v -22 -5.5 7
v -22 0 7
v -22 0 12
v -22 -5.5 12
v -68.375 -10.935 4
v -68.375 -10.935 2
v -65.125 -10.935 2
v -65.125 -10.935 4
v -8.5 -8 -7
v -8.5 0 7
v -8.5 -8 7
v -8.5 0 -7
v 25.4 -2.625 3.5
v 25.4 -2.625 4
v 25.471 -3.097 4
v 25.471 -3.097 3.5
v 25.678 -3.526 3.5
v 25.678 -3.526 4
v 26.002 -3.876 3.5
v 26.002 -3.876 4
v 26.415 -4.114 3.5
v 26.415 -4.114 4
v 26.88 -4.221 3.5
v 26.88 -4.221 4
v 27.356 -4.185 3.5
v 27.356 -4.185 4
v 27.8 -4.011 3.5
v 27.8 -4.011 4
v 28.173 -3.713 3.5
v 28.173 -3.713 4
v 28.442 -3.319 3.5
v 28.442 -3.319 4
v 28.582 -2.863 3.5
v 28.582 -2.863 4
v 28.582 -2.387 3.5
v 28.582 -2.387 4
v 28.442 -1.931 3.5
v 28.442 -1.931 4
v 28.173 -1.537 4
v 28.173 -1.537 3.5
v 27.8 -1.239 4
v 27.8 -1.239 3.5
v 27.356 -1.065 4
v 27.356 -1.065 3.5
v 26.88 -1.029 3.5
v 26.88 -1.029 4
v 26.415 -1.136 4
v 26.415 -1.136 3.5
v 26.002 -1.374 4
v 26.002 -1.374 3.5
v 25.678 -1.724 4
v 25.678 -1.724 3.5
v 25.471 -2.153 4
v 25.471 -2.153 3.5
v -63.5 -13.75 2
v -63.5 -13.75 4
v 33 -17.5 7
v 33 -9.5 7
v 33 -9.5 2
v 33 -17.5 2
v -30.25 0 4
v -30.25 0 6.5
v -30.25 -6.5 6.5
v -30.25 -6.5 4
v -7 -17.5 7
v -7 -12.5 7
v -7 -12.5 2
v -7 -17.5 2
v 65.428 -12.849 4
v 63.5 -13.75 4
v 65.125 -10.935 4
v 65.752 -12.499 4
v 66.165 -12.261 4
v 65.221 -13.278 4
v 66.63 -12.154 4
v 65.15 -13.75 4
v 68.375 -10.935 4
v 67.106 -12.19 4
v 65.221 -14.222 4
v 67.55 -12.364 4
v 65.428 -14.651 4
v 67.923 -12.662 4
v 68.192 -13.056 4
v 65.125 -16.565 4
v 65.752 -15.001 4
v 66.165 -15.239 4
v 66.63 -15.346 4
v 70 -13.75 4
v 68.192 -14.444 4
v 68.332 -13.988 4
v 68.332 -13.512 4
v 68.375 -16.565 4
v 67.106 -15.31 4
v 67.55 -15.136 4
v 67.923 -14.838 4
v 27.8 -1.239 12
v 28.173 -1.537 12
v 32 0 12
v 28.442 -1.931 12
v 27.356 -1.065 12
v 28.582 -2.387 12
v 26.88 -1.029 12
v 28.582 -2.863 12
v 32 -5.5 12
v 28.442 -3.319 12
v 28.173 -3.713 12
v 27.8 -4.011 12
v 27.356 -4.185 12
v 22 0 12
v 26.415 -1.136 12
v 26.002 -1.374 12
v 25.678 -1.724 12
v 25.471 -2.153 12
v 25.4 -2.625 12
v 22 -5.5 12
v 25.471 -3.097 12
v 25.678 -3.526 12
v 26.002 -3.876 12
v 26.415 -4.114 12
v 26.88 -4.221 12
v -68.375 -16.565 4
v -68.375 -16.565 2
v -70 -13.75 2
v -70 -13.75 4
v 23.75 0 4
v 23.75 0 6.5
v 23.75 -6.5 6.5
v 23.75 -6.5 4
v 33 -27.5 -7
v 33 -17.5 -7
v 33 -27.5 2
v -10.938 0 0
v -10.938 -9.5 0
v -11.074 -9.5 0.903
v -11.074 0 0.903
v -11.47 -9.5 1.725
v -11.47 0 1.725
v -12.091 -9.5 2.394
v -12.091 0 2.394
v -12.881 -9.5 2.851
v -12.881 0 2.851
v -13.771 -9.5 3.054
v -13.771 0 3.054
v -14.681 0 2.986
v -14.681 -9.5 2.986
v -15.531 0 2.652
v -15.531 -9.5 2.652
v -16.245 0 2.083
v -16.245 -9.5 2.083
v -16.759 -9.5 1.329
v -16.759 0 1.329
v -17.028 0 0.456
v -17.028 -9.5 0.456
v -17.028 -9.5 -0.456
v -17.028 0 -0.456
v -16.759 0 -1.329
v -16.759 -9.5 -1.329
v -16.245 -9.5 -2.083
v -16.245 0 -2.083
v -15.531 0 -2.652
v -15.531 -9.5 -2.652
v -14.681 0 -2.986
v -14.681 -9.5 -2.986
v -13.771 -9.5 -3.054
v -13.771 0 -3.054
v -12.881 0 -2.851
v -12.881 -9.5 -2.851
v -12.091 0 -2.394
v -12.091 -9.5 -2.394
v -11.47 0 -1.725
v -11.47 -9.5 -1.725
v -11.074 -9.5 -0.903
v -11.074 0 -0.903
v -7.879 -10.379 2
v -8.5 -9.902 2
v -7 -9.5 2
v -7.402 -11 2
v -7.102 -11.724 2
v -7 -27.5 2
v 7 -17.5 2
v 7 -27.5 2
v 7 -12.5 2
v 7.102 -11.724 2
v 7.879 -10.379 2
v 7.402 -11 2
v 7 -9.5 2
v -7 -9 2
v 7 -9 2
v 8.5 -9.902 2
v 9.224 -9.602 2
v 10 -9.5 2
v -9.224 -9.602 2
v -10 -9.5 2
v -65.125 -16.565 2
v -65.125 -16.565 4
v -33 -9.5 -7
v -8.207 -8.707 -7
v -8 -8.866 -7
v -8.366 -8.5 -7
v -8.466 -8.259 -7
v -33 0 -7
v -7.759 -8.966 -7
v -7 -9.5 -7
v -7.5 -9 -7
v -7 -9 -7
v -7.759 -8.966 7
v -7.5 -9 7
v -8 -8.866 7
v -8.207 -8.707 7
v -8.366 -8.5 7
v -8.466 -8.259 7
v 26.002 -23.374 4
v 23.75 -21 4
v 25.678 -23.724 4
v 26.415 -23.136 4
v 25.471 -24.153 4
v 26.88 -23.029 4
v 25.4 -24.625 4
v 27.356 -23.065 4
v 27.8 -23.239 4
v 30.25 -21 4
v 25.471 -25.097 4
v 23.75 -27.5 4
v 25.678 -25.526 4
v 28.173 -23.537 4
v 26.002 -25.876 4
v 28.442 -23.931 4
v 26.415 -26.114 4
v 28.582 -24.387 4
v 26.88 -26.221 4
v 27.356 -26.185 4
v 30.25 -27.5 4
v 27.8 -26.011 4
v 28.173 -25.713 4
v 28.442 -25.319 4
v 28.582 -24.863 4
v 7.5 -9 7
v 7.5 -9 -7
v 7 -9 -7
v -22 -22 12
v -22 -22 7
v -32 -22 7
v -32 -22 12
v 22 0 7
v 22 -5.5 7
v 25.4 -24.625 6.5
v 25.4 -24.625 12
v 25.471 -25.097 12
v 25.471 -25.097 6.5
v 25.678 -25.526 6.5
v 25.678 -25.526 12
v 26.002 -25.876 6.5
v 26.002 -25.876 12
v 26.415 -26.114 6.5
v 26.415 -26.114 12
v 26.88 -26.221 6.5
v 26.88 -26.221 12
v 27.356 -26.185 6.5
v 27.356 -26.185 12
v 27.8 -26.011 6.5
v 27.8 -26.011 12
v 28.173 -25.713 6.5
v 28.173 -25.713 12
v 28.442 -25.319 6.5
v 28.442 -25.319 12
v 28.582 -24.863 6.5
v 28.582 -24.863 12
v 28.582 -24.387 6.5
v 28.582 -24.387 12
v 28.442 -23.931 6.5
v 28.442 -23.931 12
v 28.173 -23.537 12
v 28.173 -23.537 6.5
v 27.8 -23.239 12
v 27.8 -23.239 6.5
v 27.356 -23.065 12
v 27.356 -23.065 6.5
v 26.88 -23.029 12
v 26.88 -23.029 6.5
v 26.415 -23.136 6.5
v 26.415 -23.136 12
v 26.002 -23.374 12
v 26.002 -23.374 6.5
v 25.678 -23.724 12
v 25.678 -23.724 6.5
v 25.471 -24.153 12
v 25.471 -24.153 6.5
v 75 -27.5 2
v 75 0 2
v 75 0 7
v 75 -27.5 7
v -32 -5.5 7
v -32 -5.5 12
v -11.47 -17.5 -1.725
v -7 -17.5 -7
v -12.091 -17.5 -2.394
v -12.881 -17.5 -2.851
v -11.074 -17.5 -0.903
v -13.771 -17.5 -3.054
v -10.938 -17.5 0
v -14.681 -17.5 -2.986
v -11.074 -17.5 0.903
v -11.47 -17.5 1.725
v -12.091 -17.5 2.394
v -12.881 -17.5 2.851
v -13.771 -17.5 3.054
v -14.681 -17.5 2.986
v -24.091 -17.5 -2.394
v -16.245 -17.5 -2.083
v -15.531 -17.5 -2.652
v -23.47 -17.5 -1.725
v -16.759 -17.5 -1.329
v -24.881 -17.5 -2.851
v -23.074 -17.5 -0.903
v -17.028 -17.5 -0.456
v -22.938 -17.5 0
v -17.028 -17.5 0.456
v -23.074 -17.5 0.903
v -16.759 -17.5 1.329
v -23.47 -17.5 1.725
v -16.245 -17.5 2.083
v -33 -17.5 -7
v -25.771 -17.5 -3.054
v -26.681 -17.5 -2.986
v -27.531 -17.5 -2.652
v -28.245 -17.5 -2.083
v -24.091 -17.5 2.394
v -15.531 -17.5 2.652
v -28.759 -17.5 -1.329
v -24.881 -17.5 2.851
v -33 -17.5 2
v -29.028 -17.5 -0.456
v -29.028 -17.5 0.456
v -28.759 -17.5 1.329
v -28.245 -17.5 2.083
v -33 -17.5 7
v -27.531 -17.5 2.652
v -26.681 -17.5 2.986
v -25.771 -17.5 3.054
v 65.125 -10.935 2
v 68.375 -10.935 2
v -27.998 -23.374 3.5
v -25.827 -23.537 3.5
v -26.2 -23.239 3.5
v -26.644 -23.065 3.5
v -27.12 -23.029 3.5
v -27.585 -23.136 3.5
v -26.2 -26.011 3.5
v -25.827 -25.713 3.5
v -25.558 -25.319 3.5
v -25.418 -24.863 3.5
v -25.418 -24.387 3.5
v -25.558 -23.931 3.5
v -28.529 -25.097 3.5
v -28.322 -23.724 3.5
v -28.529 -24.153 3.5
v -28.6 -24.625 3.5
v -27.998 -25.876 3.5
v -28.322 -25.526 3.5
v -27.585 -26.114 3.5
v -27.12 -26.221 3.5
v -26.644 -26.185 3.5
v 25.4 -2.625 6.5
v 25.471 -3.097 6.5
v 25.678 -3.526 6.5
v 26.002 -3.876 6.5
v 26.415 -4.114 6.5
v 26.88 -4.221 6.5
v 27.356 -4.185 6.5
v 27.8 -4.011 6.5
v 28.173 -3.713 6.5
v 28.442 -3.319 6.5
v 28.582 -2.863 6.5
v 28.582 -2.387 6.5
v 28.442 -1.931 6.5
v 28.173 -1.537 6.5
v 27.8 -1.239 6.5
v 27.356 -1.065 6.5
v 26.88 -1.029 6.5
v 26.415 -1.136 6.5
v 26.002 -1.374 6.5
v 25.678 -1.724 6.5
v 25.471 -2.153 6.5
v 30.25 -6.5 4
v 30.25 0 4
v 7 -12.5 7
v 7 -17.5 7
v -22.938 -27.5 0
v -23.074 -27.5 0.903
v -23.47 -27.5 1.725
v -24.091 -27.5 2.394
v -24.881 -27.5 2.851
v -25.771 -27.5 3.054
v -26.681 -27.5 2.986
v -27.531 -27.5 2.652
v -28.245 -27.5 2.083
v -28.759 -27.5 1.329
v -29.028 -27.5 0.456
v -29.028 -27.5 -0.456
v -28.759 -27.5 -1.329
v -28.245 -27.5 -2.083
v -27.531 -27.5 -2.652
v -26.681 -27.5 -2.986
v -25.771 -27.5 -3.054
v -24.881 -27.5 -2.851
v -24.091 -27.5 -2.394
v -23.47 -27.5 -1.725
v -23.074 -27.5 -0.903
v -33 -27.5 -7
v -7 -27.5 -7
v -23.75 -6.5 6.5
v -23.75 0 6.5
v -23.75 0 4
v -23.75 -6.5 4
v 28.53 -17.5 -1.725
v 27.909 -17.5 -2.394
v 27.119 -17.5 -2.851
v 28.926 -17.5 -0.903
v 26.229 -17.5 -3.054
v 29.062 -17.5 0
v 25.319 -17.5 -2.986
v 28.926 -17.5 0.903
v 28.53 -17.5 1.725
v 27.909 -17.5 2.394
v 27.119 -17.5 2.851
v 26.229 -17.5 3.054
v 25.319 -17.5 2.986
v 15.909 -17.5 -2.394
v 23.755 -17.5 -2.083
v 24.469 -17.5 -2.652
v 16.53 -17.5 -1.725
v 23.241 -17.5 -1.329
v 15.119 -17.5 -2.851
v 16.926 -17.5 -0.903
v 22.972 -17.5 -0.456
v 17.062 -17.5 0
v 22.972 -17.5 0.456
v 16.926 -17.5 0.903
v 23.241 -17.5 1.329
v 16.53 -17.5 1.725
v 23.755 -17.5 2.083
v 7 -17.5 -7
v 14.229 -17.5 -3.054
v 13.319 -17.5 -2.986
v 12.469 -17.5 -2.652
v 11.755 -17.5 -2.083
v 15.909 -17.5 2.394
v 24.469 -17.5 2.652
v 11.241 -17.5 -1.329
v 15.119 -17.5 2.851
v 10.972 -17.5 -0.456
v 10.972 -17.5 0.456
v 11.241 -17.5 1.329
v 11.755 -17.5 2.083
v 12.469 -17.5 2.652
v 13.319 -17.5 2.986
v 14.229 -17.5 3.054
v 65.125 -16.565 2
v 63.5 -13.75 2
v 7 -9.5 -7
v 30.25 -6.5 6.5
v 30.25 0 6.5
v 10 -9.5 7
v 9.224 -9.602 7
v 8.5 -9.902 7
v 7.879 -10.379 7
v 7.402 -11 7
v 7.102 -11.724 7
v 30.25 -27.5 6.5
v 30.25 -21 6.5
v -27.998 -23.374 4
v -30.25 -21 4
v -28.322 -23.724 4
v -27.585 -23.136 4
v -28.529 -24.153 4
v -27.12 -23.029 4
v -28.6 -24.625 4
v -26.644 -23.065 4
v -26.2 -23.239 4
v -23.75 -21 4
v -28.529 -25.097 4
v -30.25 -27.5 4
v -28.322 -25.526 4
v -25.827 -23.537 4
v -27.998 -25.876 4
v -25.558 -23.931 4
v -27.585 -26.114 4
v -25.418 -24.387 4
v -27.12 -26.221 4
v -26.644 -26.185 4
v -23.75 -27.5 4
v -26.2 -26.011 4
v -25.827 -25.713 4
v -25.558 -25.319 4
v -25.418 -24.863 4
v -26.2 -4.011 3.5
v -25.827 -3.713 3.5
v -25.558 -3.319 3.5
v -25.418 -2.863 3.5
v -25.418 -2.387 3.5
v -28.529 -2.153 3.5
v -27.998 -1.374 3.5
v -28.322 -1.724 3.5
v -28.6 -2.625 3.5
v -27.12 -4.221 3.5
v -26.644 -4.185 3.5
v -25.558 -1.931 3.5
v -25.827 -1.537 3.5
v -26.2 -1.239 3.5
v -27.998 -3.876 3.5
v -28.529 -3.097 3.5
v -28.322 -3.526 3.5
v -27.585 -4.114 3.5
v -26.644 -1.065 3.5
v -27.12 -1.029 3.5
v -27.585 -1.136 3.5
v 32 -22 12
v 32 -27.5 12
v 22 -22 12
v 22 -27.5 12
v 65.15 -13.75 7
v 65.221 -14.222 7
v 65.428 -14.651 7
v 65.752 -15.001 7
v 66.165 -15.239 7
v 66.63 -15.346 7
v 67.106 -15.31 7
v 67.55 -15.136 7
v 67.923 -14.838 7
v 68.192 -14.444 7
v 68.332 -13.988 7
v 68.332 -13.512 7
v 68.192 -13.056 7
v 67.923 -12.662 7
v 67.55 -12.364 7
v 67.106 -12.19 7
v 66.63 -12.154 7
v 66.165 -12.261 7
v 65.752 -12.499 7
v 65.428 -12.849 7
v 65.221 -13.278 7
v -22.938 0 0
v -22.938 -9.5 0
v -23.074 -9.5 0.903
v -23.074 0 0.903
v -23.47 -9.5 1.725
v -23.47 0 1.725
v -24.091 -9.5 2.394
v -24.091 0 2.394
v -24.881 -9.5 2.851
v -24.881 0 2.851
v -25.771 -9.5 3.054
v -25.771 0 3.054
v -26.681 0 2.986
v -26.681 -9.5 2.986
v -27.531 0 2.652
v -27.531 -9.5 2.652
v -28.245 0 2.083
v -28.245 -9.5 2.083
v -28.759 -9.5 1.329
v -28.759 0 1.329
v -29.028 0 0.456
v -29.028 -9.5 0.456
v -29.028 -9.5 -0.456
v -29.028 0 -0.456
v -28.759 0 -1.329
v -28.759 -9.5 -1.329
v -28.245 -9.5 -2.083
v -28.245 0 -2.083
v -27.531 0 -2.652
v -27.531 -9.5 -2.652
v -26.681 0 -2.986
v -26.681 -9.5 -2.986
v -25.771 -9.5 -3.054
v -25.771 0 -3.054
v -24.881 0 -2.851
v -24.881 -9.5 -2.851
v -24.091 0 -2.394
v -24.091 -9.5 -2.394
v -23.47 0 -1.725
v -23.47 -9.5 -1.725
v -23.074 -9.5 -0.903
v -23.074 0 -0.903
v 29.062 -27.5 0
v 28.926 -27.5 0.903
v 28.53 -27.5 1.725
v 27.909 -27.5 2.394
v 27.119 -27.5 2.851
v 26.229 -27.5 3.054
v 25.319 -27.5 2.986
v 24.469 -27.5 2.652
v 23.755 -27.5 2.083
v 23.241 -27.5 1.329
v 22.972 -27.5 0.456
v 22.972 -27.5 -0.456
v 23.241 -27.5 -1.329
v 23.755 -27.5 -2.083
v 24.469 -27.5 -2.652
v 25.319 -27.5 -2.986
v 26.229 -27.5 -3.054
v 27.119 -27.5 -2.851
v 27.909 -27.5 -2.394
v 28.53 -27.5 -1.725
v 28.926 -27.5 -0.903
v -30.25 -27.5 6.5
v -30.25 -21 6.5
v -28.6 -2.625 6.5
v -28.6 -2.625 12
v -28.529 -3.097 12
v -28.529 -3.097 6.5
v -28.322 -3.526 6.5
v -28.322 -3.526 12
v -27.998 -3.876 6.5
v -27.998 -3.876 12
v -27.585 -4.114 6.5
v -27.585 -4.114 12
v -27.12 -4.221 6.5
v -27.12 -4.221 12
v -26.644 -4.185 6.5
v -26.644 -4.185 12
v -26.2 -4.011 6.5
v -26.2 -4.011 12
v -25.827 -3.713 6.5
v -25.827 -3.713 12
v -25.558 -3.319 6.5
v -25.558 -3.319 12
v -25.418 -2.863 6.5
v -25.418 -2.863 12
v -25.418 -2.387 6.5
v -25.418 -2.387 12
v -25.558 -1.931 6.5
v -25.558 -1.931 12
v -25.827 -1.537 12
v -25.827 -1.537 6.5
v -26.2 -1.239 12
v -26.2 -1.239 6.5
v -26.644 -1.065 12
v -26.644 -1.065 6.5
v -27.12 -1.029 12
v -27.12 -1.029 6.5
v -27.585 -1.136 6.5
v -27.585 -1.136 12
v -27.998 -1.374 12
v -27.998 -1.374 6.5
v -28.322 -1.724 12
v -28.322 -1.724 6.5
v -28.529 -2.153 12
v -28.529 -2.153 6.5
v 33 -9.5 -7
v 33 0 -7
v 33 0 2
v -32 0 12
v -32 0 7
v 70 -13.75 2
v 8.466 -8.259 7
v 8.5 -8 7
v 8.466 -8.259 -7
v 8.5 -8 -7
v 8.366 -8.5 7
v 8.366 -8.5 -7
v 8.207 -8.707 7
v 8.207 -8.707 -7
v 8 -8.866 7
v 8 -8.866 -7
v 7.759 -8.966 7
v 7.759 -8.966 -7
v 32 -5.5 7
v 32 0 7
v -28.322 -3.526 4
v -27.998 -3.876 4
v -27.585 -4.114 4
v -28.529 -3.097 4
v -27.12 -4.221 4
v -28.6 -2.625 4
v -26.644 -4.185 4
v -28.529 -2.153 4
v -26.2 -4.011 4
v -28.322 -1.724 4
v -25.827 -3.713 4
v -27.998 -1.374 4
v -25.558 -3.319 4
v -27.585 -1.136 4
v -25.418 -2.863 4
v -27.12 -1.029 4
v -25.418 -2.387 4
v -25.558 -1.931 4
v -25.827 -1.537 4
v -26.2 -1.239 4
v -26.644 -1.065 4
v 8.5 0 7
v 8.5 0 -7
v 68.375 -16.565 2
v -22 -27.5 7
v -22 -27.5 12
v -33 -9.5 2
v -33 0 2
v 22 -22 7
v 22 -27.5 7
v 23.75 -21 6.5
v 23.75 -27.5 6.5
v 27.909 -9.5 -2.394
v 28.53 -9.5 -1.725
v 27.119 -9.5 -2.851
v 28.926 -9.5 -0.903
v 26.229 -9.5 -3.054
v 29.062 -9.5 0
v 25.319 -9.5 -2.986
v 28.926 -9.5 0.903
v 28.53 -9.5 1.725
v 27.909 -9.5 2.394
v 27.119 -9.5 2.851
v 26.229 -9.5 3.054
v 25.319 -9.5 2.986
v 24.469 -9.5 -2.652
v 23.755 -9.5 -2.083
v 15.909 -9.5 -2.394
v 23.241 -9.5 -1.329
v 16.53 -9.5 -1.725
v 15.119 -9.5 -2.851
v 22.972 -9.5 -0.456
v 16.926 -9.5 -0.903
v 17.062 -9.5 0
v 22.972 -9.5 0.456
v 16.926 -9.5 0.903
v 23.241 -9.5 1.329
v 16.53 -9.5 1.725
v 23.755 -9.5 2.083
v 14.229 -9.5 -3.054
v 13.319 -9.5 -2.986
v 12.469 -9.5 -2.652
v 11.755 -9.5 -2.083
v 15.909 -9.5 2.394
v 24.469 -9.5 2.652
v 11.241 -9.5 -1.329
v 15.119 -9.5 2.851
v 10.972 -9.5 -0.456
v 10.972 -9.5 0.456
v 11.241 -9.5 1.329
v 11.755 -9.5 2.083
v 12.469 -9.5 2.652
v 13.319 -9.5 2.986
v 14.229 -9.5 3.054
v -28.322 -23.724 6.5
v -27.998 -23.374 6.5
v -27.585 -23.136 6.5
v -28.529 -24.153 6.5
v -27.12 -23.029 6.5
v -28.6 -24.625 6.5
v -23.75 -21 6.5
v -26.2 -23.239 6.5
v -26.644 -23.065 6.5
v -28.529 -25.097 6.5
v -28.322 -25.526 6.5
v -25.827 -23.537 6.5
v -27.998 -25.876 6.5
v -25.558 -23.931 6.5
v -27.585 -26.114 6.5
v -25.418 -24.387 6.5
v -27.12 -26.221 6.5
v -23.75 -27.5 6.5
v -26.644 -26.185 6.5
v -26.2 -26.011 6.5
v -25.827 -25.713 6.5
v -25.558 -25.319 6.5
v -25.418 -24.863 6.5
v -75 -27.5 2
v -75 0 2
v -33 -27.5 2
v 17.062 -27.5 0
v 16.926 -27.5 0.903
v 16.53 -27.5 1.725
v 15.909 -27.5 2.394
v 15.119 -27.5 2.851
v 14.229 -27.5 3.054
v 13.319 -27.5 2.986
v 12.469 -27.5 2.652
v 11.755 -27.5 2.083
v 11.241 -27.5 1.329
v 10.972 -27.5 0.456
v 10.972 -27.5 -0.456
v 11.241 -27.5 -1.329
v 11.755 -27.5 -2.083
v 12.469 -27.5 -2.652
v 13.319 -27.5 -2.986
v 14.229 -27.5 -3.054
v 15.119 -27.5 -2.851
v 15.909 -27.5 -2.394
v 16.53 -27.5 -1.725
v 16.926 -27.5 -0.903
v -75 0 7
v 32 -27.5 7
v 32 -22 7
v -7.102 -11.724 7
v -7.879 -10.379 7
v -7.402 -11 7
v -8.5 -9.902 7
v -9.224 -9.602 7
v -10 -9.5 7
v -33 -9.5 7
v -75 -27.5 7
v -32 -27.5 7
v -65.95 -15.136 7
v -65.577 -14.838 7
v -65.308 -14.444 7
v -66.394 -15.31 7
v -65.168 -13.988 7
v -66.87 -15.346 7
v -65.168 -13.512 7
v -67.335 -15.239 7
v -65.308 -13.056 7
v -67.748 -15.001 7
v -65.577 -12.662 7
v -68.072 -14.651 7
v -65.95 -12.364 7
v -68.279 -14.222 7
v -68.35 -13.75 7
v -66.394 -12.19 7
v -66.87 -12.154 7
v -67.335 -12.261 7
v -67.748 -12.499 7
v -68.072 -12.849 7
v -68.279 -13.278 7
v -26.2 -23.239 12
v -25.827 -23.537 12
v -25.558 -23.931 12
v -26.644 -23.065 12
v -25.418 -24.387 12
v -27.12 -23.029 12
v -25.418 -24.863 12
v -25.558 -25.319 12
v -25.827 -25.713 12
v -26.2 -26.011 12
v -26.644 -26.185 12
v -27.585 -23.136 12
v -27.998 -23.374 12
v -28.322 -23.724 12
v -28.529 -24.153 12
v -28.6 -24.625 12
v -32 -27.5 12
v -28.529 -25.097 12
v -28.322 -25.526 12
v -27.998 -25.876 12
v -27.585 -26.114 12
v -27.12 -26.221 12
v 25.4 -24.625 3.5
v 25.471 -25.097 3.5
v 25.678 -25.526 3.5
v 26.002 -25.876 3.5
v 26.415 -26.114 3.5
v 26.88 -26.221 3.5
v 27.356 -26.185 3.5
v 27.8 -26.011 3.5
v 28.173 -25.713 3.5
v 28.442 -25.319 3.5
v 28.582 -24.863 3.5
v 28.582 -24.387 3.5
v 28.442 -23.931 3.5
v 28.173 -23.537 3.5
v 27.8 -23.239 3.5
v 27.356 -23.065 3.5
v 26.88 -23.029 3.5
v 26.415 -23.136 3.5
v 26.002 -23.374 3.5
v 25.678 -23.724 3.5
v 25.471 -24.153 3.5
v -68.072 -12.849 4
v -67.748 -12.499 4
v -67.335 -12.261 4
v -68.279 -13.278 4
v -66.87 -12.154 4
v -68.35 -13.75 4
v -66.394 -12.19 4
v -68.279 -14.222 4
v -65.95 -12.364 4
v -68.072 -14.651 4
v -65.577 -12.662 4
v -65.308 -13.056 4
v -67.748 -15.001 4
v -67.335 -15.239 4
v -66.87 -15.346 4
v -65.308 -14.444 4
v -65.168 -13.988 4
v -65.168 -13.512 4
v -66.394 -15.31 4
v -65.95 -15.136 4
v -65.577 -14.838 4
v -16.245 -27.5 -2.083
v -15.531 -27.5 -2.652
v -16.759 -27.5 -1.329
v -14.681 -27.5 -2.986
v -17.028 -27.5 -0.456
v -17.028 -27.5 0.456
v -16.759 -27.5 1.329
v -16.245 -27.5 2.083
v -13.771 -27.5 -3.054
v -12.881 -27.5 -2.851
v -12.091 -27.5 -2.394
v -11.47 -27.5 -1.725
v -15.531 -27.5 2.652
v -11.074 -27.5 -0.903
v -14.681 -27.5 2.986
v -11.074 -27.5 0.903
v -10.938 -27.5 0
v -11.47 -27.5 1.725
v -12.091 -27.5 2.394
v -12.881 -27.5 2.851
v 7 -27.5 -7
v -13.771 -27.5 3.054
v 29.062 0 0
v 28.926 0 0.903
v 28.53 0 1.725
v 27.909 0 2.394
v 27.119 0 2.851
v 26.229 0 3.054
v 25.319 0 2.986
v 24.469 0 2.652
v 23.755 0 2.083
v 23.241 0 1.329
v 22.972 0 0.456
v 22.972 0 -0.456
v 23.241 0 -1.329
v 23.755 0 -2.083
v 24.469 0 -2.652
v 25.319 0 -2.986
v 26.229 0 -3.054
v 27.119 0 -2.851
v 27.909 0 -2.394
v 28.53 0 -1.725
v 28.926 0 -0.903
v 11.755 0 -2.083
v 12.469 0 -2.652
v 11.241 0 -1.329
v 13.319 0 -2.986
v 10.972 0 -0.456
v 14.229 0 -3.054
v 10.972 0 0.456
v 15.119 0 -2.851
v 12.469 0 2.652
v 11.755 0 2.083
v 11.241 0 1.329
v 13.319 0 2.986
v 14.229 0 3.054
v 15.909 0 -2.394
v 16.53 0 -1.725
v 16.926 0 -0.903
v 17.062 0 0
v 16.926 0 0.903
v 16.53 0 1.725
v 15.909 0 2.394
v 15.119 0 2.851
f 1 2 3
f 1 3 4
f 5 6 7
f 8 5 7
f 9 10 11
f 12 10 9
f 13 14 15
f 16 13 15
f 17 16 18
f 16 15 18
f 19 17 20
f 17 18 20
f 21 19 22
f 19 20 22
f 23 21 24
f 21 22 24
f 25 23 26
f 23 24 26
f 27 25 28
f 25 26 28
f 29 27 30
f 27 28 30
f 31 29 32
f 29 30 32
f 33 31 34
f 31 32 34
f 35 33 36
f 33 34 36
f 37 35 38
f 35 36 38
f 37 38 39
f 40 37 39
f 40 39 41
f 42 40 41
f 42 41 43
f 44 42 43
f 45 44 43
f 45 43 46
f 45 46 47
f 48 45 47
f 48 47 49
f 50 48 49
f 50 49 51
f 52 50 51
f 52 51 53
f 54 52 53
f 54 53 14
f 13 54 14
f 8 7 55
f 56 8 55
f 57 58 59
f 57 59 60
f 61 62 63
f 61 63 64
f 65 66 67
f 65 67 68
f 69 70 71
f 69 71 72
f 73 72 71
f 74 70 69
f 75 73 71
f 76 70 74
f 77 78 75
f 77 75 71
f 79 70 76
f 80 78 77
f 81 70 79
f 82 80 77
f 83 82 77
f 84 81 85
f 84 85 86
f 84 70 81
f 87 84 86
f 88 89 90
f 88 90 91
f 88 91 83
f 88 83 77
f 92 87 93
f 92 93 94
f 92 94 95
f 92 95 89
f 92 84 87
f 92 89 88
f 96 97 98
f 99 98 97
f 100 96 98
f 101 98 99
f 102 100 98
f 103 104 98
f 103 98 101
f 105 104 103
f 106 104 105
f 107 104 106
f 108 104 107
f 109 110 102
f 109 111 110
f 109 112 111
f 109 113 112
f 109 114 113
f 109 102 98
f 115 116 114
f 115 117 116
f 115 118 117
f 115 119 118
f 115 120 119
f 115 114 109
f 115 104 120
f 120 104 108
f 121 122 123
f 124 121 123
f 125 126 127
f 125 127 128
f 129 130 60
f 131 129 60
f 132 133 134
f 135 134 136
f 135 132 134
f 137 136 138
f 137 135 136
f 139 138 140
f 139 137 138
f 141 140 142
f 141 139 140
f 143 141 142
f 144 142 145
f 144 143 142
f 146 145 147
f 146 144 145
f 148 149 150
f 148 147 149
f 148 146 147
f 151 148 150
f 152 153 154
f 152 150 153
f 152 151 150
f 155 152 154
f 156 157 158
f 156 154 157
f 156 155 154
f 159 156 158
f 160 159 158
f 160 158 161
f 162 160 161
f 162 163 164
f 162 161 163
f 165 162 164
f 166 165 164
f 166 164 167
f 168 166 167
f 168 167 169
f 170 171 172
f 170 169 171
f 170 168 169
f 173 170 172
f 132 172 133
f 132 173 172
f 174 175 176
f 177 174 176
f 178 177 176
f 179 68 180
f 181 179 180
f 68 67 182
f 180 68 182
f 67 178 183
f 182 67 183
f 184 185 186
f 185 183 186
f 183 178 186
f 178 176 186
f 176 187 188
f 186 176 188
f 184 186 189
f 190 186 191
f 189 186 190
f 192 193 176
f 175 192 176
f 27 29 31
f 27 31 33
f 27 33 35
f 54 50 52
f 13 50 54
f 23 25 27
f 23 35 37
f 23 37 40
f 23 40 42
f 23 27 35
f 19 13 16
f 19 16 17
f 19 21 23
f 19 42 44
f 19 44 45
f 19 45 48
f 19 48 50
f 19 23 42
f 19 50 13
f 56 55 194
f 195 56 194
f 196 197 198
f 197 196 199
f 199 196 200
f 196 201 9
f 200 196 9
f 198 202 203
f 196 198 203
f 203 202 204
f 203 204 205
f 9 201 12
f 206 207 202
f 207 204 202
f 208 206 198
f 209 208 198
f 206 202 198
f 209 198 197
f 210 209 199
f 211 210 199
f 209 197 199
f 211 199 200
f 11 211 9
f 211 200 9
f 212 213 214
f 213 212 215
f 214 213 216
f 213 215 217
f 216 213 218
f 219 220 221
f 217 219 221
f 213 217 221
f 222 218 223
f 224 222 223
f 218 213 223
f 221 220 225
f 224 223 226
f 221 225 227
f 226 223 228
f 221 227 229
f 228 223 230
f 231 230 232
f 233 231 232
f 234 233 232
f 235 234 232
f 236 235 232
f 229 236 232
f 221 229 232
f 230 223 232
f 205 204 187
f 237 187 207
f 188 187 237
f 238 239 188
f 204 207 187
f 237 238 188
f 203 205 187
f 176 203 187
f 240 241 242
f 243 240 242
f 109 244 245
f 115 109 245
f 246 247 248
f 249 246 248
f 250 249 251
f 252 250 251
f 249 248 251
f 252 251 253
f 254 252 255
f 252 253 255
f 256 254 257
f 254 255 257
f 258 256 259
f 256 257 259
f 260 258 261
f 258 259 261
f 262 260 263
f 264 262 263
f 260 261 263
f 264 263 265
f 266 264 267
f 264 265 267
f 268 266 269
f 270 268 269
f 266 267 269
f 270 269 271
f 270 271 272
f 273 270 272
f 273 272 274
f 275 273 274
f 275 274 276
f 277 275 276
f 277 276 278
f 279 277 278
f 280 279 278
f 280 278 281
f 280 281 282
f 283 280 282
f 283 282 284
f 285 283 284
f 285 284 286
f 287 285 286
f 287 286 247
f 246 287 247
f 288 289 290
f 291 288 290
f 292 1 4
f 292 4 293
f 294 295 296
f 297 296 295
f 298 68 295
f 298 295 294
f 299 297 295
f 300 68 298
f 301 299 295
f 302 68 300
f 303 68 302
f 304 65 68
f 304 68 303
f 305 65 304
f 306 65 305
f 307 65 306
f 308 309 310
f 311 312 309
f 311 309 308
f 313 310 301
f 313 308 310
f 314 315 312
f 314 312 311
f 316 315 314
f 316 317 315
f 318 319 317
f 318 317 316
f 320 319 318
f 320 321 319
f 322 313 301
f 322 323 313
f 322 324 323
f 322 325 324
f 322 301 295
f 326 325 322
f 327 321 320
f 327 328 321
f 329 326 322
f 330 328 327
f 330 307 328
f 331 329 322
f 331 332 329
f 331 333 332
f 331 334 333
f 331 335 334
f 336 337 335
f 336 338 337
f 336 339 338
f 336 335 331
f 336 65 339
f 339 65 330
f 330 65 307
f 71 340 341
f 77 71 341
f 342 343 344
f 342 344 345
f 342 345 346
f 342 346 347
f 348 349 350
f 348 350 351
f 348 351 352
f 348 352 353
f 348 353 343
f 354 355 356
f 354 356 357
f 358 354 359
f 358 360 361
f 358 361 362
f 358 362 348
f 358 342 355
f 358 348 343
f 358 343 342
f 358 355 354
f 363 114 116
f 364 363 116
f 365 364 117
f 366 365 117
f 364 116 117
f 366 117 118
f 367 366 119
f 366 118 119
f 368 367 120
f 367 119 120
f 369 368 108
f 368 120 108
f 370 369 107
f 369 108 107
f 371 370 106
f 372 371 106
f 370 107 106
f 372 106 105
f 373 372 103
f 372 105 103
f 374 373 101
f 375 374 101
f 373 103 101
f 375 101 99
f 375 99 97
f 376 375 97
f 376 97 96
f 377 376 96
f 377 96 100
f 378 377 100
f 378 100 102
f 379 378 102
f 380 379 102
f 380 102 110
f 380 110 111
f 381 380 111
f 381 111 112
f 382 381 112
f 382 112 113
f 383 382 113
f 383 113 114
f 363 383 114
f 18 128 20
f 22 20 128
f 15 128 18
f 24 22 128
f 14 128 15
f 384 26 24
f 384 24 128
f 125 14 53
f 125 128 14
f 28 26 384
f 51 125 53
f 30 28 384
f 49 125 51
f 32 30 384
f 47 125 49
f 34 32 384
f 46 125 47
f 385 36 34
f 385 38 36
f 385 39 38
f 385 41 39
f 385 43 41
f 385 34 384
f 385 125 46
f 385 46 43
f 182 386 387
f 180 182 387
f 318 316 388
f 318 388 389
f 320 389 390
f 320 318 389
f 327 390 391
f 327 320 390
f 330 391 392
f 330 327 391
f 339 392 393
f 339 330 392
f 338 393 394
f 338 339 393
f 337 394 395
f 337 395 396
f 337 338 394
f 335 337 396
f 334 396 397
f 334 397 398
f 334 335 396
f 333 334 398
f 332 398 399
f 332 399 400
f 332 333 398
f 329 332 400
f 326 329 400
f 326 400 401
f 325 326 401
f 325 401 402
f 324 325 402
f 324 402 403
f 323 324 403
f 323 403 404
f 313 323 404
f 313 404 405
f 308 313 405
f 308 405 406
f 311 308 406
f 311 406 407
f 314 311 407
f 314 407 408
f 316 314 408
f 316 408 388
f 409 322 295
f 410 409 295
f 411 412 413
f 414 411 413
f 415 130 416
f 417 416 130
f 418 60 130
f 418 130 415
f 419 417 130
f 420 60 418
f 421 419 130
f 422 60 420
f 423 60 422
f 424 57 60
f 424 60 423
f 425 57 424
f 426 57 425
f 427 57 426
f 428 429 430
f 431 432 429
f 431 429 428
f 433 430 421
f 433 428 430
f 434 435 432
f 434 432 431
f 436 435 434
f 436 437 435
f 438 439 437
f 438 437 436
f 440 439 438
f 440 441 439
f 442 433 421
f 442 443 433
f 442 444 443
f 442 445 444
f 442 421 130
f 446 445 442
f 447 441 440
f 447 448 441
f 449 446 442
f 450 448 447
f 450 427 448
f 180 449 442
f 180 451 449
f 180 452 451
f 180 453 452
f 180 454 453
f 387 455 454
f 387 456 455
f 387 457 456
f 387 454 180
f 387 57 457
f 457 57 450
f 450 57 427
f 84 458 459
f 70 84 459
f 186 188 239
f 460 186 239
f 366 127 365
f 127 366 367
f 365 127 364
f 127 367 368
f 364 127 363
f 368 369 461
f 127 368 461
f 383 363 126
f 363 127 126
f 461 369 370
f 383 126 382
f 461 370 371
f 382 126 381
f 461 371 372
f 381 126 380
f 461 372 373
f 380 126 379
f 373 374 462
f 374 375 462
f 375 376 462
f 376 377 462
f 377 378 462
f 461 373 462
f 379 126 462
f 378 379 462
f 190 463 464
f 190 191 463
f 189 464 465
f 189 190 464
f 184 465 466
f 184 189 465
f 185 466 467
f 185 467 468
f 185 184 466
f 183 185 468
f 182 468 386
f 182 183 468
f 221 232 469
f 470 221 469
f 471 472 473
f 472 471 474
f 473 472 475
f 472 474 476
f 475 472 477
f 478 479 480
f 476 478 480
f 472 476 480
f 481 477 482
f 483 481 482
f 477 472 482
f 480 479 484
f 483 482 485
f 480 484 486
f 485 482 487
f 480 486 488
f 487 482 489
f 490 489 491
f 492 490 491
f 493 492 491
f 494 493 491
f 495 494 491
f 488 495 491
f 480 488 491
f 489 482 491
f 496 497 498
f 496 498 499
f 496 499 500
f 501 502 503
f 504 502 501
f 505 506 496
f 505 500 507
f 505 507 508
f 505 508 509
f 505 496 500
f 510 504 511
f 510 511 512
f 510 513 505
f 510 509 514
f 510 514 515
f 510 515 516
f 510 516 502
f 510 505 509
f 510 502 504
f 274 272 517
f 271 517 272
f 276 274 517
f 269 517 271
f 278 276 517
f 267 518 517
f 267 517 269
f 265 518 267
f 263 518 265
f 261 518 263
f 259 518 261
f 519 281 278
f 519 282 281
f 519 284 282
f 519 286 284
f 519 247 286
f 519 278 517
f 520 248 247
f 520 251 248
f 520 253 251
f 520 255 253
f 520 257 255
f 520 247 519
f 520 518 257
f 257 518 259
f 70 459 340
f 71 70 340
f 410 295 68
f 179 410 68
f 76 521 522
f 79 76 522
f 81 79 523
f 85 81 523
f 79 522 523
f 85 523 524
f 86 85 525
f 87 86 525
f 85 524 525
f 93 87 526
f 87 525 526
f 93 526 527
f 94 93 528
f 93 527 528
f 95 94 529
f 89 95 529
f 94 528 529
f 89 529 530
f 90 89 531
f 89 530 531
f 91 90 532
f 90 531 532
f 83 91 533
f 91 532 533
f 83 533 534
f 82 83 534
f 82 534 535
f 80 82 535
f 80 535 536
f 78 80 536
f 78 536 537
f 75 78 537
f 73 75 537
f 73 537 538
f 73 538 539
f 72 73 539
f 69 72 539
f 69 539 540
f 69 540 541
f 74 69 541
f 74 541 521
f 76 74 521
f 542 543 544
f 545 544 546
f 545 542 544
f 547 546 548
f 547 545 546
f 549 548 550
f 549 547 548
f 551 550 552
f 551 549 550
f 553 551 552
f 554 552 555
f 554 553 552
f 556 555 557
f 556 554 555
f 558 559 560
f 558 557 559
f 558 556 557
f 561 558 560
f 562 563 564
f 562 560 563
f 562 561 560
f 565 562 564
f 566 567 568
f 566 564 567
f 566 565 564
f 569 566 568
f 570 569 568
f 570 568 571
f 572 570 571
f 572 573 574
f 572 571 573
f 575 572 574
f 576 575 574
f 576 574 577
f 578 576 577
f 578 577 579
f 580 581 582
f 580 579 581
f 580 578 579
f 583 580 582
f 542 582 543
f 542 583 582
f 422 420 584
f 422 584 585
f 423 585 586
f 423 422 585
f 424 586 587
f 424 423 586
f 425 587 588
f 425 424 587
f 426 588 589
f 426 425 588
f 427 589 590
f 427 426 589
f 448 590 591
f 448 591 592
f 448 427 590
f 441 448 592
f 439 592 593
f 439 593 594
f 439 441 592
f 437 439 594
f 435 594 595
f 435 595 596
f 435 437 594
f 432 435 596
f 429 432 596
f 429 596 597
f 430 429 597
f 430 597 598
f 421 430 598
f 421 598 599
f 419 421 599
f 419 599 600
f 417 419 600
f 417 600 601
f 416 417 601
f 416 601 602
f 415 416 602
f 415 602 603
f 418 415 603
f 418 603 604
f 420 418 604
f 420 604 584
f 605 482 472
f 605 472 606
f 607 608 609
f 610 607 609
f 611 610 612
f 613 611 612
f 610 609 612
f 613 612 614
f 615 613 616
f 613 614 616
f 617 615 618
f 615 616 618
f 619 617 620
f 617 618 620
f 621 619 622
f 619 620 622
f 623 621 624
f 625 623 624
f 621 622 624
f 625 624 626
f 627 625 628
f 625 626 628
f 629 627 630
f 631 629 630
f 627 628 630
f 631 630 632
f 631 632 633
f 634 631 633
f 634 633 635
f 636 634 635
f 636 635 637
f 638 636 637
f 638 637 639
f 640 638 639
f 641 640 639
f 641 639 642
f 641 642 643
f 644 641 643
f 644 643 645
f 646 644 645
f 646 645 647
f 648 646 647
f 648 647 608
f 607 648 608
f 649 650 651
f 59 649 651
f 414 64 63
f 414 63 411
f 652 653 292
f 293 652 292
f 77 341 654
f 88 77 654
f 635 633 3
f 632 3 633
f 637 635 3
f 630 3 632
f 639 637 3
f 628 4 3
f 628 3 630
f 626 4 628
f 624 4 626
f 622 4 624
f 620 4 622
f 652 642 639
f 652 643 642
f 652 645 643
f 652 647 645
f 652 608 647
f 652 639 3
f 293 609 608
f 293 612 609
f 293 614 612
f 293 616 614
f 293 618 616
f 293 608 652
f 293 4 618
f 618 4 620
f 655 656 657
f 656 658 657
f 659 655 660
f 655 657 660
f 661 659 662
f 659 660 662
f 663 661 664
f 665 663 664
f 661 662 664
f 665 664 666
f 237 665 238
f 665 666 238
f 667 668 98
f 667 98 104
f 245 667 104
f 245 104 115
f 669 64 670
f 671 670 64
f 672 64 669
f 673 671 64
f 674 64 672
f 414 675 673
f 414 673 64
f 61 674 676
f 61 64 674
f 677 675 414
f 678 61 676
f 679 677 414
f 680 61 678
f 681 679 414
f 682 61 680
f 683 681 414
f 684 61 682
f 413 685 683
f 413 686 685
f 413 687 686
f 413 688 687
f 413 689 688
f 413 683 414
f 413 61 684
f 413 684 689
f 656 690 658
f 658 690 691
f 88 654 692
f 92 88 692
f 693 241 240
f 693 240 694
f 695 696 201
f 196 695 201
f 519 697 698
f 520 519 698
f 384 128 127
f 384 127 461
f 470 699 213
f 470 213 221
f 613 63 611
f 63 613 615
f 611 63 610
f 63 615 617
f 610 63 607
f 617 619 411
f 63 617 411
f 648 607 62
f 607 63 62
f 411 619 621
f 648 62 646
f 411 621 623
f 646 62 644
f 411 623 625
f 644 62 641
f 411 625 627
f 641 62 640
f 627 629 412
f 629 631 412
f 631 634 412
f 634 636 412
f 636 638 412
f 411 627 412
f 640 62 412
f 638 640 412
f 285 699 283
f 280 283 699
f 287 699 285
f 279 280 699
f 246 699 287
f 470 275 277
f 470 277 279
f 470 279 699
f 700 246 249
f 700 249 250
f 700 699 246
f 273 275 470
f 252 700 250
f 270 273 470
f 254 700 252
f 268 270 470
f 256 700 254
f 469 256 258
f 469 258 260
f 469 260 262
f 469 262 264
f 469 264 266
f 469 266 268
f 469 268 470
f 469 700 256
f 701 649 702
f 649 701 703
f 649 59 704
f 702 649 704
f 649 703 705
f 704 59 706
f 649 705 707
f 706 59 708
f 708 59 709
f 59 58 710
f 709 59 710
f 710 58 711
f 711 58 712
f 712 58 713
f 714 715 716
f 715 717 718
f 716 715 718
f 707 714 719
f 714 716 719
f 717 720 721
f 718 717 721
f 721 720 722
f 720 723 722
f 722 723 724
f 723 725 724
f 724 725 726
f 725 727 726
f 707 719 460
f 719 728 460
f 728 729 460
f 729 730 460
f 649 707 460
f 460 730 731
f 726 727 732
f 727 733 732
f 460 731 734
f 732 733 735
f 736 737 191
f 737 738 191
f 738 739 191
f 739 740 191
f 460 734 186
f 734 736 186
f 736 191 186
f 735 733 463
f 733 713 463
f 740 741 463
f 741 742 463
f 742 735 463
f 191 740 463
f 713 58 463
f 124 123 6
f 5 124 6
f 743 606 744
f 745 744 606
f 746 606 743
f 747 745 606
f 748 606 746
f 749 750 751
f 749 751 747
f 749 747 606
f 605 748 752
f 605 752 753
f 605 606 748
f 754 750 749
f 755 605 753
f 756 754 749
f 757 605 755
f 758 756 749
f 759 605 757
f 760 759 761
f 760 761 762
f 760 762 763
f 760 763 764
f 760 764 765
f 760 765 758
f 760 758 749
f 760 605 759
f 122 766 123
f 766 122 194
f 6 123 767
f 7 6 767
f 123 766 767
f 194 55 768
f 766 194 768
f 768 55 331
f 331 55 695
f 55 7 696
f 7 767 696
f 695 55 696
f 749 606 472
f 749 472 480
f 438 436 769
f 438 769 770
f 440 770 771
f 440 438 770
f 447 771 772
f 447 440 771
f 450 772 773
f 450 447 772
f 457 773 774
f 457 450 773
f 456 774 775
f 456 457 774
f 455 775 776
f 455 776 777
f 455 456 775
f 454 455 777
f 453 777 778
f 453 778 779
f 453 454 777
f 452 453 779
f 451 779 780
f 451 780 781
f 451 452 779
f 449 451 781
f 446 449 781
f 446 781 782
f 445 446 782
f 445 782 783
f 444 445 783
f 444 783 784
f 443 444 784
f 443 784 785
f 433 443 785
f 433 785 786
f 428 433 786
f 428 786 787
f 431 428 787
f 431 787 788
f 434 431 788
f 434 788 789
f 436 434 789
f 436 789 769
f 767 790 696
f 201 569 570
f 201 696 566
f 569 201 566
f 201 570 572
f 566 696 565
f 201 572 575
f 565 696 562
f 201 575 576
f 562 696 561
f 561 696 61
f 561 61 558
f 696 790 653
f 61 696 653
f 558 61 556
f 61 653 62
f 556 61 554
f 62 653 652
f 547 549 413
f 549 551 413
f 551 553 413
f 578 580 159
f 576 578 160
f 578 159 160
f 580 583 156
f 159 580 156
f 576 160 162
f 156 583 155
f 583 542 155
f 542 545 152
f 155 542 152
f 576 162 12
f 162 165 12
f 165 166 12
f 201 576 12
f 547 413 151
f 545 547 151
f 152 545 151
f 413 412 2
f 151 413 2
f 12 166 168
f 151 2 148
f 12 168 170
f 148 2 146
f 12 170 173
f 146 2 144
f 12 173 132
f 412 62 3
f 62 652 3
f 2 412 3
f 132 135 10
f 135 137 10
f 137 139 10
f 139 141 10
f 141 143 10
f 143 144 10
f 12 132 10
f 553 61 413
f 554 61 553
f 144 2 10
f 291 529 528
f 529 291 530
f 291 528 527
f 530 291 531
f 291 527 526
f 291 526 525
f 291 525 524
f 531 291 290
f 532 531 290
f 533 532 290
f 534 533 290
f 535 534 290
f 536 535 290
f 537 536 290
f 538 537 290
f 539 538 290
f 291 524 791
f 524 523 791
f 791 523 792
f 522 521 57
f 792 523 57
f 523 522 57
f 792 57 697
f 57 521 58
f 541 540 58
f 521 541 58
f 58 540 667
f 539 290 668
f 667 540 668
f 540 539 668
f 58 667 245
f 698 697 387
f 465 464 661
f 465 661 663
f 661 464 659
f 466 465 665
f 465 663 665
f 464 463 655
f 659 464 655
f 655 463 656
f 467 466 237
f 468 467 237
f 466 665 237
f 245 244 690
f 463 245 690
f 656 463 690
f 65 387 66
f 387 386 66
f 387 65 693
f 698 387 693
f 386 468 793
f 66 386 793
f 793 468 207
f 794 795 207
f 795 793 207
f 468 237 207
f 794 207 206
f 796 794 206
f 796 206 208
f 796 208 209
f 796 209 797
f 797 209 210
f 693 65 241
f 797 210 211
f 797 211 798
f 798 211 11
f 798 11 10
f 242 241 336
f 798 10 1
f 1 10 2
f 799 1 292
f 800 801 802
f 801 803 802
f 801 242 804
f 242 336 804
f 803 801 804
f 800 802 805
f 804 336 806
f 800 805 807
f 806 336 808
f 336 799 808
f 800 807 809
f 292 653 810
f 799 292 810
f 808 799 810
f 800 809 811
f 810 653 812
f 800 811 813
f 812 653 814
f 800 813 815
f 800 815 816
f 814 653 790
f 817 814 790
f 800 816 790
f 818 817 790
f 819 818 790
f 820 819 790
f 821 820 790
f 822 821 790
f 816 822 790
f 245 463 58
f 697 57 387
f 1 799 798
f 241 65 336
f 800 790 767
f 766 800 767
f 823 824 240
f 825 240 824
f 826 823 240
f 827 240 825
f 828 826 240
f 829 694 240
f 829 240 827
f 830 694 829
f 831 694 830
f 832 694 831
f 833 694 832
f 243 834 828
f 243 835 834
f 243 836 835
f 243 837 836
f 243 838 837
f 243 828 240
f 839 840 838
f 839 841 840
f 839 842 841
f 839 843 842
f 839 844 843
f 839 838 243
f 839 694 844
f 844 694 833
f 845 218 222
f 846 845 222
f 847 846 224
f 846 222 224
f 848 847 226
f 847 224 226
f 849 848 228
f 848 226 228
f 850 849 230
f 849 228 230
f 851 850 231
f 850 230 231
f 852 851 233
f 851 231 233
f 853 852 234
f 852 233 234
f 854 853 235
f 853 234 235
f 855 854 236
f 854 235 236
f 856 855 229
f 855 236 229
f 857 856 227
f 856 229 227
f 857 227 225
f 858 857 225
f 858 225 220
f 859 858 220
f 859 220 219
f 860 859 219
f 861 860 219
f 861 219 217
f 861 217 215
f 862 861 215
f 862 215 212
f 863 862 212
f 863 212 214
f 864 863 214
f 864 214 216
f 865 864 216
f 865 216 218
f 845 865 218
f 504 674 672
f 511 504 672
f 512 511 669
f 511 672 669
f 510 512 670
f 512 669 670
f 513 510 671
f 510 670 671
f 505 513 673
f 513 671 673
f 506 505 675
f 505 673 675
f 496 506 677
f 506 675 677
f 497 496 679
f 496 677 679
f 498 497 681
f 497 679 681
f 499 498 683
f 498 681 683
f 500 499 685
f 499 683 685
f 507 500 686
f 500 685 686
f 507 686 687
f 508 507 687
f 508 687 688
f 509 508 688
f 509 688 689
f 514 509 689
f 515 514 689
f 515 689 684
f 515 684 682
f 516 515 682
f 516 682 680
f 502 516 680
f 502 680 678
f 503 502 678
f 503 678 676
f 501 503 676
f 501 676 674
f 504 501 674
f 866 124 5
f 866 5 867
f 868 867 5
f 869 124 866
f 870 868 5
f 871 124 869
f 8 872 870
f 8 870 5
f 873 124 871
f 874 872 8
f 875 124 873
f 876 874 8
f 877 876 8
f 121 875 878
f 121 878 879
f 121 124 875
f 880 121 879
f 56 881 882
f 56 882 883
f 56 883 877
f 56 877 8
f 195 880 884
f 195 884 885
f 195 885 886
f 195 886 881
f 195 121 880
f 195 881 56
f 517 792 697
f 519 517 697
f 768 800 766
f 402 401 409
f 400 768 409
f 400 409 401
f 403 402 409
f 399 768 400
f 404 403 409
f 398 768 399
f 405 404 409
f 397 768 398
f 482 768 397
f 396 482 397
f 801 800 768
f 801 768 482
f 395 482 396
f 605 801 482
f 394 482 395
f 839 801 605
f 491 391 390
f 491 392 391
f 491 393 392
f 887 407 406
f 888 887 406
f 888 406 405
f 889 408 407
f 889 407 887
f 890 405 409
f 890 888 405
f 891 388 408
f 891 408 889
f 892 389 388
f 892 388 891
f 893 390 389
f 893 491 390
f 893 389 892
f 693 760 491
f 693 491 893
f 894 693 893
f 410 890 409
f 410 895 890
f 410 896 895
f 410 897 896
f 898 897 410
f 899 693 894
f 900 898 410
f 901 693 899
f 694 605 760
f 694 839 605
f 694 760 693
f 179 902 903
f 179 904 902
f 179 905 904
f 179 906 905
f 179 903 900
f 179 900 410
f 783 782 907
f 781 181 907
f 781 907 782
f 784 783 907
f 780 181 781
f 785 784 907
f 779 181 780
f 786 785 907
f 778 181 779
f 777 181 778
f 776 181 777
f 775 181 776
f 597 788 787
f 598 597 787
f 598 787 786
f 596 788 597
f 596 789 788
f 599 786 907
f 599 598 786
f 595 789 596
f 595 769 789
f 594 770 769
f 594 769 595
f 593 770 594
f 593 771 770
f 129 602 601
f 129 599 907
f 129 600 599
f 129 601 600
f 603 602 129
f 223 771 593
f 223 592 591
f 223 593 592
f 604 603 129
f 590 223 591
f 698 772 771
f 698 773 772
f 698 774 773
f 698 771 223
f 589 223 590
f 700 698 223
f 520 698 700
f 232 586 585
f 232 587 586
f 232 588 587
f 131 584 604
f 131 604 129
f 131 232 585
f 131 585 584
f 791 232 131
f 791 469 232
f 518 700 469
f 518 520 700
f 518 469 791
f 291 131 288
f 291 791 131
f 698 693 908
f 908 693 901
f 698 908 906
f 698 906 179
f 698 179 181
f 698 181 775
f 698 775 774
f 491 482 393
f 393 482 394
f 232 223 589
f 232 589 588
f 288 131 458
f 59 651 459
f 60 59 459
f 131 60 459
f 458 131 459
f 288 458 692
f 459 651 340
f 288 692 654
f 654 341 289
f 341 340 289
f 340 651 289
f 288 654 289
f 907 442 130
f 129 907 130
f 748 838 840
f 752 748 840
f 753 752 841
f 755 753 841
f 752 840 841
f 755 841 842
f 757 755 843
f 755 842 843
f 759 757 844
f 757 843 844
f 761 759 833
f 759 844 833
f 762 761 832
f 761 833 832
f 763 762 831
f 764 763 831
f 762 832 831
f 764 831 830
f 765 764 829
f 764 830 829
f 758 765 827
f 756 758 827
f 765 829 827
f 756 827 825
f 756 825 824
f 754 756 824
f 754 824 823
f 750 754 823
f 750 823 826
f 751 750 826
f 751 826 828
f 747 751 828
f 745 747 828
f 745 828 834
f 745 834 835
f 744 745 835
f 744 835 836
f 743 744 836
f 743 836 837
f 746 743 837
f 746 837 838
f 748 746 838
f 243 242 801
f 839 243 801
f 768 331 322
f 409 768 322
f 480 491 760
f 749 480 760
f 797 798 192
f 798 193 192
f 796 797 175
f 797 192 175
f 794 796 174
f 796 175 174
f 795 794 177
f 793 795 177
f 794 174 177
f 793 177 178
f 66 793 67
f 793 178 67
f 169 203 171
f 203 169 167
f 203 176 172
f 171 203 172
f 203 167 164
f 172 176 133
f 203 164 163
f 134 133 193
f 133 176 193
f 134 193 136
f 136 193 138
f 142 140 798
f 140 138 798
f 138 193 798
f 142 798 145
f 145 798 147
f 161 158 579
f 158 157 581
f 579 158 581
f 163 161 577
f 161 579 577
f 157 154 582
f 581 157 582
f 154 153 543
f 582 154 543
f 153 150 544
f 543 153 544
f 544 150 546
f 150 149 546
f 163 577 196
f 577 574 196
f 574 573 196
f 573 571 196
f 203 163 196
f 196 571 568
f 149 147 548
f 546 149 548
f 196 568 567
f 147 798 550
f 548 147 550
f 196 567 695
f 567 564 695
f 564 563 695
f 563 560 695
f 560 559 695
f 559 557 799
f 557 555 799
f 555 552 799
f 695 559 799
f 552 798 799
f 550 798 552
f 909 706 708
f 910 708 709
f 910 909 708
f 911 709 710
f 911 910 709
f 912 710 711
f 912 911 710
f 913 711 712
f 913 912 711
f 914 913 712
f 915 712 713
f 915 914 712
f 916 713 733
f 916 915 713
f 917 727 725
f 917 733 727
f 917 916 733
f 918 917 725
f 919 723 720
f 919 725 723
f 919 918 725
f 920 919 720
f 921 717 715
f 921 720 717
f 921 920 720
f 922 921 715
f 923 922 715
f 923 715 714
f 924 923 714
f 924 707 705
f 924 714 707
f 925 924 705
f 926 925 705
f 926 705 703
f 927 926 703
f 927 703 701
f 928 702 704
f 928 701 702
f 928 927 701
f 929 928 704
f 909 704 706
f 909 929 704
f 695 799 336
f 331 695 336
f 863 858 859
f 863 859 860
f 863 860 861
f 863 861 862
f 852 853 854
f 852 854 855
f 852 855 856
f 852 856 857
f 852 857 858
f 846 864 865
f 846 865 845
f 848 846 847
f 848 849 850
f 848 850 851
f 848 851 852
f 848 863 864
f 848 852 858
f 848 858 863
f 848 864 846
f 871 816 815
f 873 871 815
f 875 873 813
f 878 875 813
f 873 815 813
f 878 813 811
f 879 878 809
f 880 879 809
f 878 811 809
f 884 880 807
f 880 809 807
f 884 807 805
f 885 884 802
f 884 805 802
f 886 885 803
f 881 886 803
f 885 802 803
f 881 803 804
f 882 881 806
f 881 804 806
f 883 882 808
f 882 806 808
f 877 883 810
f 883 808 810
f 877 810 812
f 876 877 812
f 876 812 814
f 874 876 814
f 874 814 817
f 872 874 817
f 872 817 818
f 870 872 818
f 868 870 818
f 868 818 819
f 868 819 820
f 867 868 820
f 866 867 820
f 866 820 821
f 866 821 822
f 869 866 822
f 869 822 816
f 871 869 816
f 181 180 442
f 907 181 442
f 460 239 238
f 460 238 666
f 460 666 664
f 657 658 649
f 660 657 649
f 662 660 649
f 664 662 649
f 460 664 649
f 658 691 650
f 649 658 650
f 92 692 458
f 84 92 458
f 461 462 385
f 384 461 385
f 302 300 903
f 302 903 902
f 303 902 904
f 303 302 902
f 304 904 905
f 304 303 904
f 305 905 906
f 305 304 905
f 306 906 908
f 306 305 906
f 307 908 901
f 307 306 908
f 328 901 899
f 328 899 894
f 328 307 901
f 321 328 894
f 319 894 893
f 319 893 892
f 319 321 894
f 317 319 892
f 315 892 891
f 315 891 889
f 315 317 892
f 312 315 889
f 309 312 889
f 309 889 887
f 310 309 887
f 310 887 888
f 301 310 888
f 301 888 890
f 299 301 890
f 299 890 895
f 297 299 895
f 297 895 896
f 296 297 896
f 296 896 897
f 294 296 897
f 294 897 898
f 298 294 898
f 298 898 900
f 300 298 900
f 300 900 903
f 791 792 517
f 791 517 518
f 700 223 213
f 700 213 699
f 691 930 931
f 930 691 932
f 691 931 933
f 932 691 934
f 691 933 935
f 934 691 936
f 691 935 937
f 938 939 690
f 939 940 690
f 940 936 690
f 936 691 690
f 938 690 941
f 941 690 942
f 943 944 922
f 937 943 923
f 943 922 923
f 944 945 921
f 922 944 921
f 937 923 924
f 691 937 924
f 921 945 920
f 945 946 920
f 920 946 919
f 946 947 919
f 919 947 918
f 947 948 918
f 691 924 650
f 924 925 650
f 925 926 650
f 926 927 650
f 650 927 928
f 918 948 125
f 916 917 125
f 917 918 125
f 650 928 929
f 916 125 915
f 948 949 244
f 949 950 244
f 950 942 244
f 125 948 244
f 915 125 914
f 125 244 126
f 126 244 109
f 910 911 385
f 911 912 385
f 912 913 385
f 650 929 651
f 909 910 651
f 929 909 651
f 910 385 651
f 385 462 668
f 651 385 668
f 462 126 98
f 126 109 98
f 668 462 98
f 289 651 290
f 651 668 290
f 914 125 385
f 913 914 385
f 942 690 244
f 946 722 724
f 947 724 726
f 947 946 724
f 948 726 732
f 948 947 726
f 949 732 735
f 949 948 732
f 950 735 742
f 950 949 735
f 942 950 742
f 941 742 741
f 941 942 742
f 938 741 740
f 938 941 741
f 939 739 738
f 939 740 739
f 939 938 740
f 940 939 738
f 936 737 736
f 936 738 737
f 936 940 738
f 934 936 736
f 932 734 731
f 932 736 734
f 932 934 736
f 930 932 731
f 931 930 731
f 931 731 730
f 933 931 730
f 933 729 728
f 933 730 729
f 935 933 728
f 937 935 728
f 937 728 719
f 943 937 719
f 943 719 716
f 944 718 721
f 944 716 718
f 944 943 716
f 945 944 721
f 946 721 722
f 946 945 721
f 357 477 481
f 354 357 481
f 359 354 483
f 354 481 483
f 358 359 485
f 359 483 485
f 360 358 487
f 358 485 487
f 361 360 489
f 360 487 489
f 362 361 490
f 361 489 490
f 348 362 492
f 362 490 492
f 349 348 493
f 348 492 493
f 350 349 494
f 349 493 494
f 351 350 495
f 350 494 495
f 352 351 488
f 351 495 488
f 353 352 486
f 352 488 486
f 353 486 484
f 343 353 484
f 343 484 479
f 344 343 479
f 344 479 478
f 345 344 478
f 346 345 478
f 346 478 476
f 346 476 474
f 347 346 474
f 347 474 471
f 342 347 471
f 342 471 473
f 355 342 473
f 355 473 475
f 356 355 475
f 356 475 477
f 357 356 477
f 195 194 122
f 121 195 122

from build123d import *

# Parameters (mm, degrees)
SKETCH034_R     = 3.0625
PAD004_DEPTH    = 27.5
SKETCH_R        = 1.6
POCKET_DEPTH    = 5
POCKET021_DEPTH = 2
SKETCH036_W     = 26
SKETCH036_H     = 8
POCKET022_DEPTH = 14
SKETCH037_W     = 10
SKETCH037_H     = 5.5
PAD005_DEPTH    = 5
SKETCH038_R     = 1.6
POCKET023_DEPTH = 8.5
SKETCH039_W     = 6.5
SKETCH039_H     = 2.5
POCKET024_DEPTH = 6.5
SKETCH040_W     = 6.5
SKETCH040_H     = 2.5
POCKET025_DEPTH = 6.5
SKETCH041_W     = 17
SKETCH041_H     = 14
POCKET026_DEPTH = 9
FILLET_R        = 1
FILLET001_R     = 3


with BuildPart() as part:
    # Sketch034 → Pad004 (new body)
    with BuildSketch(Plane.XZ):
        Polygon((33, -7), (33, 2), (75, 2), (75, 7), (-75, 7), (-75, 2), (-33, 2), (-33, -7), (-7, -7), (-7, 2), (7, 2), (7, -7), align=None)
        with Locations((-14, 0)):
            Circle(SKETCH034_R, mode=Mode.SUBTRACT)
        with Locations((14, 0)):
            Circle(SKETCH034_R, mode=Mode.SUBTRACT)
        with Locations((-26, 0)):
            Circle(SKETCH034_R, mode=Mode.SUBTRACT)
        with Locations((26, 0)):
            Circle(SKETCH034_R, mode=Mode.SUBTRACT)
    extrude(amount=PAD004_DEPTH)

    # Sketch (on Face4 of Pad004) → Pocket (cut)
    with BuildSketch(Plane(origin=(0, 0, 7), x_dir=(-1, 0, 0), z_dir=(0, 0, 1))):
        with Locations((-66.75, 13.75)):
            Circle(SKETCH_R)
        with Locations((66.75, 13.75)):
            Circle(SKETCH_R)
    extrude(amount=-POCKET_DEPTH, mode=Mode.SUBTRACT)

    # Sketch035 (on Face3 of Pocket) → Pocket021 (cut)
    with BuildSketch(Plane(origin=(0, 0, 2), x_dir=(1, 0, 0), z_dir=(0, 0, -1))):
        Polygon((-63.5, 13.75), (-65.125, 16.5645825623), (-68.375, 16.5645825623), (-70, 13.75), (-68.375, 10.9354174377), (-65.125, 10.9354174377), align=None)
        Polygon((70, 13.75), (68.375, 16.5645825623), (65.125, 16.5645825623), (63.5, 13.75), (65.125, 10.9354174377), (68.375, 10.9354174377), align=None)
    extrude(amount=-POCKET021_DEPTH, mode=Mode.SUBTRACT)

    # Sketch036 (on Face14 of Pocket021) → Pocket022 (cut)
    with BuildSketch(Plane(origin=(0, 0, 7), x_dir=(-1, 0, 0), z_dir=(0, 0, 1))):
        with Locations((-20, 13.5)):
            Rectangle(SKETCH036_W, SKETCH036_H)
        with Locations((20, 13.5)):
            Rectangle(SKETCH036_W, SKETCH036_H)
    extrude(amount=-POCKET022_DEPTH, mode=Mode.SUBTRACT)

    # Sketch037 (on Face7 of Pocket022) → Pad005 (join)
    with BuildSketch(Plane(origin=(0, 0, 7), x_dir=(-1, 0, 0), z_dir=(0, 0, 1))):
        with Locations((-27, 24.75)):
            Rectangle(SKETCH037_W, SKETCH037_H)
        with Locations((27, 24.75)):
            Rectangle(SKETCH037_W, SKETCH037_H)
        with Locations((-27, 2.75)):
            Rectangle(SKETCH037_W, SKETCH037_H)
        with Locations((27, 2.75)):
            Rectangle(SKETCH037_W, SKETCH037_H)
    extrude(amount=PAD005_DEPTH)

    # Sketch038 (on Face70 of Pad005) → Pocket023 (cut)
    with BuildSketch(Plane(origin=(0, 0, 12), x_dir=(-1, 0, 0), z_dir=(0, 0, 1))):
        with Locations((-27, 24.625)):
            Circle(SKETCH038_R)
        with Locations((-27, 2.625)):
            Circle(SKETCH038_R)
        with Locations((27, 24.625)):
            Circle(SKETCH038_R)
        with Locations((27, 2.625)):
            Circle(SKETCH038_R)
    extrude(amount=-POCKET023_DEPTH, mode=Mode.SUBTRACT)

    # Sketch039 (on Face2 of Pocket023) → Pocket024 (cut)
    with BuildSketch(Plane(origin=(0, 0, 0), x_dir=(1, 0, 0), z_dir=(0, 1, 0))):
        with Locations((-27, -5.25)):
            Rectangle(SKETCH039_W, SKETCH039_H)
        with Locations((27, -5.25)):
            Rectangle(SKETCH039_W, SKETCH039_H)
    extrude(amount=-POCKET024_DEPTH, mode=Mode.SUBTRACT)

    # Sketch040 (on Face31 of Pocket024) → Pocket025 (cut)
    with BuildSketch(Plane.XZ.offset(27.5)):
        with Locations((-27, 5.25)):
            Rectangle(SKETCH040_W, SKETCH040_H)
        with Locations((27, 5.25)):
            Rectangle(SKETCH040_W, SKETCH040_H)
    extrude(amount=-POCKET025_DEPTH, mode=Mode.SUBTRACT)

    # Sketch041 (on Face2 of Pocket025) → Pocket026 (cut)
    with BuildSketch(Plane(origin=(0, 0, 0), x_dir=(1, 0, 0), z_dir=(0, 1, 0))):
        Rectangle(SKETCH041_W, SKETCH041_H)
    extrude(amount=-POCKET026_DEPTH, mode=Mode.SUBTRACT)

    # Fillet
    fillet_edges = [part.edges().sort_by_distance(p)[0] for p in [
        (8.5, -9, 0),
        (-8.5, -9, 0),
    ]]
    fillet(fillet_edges, radius=FILLET_R)

    # Fillet001
    fillet001_edges = [part.edges().sort_by_distance(p)[0] for p in [
        (7, -9.5, 4.5),
        (-7, -9.5, 4.5),
    ]]
    fillet(fillet001_edges, radius=FILLET001_R)


solid = part.part
